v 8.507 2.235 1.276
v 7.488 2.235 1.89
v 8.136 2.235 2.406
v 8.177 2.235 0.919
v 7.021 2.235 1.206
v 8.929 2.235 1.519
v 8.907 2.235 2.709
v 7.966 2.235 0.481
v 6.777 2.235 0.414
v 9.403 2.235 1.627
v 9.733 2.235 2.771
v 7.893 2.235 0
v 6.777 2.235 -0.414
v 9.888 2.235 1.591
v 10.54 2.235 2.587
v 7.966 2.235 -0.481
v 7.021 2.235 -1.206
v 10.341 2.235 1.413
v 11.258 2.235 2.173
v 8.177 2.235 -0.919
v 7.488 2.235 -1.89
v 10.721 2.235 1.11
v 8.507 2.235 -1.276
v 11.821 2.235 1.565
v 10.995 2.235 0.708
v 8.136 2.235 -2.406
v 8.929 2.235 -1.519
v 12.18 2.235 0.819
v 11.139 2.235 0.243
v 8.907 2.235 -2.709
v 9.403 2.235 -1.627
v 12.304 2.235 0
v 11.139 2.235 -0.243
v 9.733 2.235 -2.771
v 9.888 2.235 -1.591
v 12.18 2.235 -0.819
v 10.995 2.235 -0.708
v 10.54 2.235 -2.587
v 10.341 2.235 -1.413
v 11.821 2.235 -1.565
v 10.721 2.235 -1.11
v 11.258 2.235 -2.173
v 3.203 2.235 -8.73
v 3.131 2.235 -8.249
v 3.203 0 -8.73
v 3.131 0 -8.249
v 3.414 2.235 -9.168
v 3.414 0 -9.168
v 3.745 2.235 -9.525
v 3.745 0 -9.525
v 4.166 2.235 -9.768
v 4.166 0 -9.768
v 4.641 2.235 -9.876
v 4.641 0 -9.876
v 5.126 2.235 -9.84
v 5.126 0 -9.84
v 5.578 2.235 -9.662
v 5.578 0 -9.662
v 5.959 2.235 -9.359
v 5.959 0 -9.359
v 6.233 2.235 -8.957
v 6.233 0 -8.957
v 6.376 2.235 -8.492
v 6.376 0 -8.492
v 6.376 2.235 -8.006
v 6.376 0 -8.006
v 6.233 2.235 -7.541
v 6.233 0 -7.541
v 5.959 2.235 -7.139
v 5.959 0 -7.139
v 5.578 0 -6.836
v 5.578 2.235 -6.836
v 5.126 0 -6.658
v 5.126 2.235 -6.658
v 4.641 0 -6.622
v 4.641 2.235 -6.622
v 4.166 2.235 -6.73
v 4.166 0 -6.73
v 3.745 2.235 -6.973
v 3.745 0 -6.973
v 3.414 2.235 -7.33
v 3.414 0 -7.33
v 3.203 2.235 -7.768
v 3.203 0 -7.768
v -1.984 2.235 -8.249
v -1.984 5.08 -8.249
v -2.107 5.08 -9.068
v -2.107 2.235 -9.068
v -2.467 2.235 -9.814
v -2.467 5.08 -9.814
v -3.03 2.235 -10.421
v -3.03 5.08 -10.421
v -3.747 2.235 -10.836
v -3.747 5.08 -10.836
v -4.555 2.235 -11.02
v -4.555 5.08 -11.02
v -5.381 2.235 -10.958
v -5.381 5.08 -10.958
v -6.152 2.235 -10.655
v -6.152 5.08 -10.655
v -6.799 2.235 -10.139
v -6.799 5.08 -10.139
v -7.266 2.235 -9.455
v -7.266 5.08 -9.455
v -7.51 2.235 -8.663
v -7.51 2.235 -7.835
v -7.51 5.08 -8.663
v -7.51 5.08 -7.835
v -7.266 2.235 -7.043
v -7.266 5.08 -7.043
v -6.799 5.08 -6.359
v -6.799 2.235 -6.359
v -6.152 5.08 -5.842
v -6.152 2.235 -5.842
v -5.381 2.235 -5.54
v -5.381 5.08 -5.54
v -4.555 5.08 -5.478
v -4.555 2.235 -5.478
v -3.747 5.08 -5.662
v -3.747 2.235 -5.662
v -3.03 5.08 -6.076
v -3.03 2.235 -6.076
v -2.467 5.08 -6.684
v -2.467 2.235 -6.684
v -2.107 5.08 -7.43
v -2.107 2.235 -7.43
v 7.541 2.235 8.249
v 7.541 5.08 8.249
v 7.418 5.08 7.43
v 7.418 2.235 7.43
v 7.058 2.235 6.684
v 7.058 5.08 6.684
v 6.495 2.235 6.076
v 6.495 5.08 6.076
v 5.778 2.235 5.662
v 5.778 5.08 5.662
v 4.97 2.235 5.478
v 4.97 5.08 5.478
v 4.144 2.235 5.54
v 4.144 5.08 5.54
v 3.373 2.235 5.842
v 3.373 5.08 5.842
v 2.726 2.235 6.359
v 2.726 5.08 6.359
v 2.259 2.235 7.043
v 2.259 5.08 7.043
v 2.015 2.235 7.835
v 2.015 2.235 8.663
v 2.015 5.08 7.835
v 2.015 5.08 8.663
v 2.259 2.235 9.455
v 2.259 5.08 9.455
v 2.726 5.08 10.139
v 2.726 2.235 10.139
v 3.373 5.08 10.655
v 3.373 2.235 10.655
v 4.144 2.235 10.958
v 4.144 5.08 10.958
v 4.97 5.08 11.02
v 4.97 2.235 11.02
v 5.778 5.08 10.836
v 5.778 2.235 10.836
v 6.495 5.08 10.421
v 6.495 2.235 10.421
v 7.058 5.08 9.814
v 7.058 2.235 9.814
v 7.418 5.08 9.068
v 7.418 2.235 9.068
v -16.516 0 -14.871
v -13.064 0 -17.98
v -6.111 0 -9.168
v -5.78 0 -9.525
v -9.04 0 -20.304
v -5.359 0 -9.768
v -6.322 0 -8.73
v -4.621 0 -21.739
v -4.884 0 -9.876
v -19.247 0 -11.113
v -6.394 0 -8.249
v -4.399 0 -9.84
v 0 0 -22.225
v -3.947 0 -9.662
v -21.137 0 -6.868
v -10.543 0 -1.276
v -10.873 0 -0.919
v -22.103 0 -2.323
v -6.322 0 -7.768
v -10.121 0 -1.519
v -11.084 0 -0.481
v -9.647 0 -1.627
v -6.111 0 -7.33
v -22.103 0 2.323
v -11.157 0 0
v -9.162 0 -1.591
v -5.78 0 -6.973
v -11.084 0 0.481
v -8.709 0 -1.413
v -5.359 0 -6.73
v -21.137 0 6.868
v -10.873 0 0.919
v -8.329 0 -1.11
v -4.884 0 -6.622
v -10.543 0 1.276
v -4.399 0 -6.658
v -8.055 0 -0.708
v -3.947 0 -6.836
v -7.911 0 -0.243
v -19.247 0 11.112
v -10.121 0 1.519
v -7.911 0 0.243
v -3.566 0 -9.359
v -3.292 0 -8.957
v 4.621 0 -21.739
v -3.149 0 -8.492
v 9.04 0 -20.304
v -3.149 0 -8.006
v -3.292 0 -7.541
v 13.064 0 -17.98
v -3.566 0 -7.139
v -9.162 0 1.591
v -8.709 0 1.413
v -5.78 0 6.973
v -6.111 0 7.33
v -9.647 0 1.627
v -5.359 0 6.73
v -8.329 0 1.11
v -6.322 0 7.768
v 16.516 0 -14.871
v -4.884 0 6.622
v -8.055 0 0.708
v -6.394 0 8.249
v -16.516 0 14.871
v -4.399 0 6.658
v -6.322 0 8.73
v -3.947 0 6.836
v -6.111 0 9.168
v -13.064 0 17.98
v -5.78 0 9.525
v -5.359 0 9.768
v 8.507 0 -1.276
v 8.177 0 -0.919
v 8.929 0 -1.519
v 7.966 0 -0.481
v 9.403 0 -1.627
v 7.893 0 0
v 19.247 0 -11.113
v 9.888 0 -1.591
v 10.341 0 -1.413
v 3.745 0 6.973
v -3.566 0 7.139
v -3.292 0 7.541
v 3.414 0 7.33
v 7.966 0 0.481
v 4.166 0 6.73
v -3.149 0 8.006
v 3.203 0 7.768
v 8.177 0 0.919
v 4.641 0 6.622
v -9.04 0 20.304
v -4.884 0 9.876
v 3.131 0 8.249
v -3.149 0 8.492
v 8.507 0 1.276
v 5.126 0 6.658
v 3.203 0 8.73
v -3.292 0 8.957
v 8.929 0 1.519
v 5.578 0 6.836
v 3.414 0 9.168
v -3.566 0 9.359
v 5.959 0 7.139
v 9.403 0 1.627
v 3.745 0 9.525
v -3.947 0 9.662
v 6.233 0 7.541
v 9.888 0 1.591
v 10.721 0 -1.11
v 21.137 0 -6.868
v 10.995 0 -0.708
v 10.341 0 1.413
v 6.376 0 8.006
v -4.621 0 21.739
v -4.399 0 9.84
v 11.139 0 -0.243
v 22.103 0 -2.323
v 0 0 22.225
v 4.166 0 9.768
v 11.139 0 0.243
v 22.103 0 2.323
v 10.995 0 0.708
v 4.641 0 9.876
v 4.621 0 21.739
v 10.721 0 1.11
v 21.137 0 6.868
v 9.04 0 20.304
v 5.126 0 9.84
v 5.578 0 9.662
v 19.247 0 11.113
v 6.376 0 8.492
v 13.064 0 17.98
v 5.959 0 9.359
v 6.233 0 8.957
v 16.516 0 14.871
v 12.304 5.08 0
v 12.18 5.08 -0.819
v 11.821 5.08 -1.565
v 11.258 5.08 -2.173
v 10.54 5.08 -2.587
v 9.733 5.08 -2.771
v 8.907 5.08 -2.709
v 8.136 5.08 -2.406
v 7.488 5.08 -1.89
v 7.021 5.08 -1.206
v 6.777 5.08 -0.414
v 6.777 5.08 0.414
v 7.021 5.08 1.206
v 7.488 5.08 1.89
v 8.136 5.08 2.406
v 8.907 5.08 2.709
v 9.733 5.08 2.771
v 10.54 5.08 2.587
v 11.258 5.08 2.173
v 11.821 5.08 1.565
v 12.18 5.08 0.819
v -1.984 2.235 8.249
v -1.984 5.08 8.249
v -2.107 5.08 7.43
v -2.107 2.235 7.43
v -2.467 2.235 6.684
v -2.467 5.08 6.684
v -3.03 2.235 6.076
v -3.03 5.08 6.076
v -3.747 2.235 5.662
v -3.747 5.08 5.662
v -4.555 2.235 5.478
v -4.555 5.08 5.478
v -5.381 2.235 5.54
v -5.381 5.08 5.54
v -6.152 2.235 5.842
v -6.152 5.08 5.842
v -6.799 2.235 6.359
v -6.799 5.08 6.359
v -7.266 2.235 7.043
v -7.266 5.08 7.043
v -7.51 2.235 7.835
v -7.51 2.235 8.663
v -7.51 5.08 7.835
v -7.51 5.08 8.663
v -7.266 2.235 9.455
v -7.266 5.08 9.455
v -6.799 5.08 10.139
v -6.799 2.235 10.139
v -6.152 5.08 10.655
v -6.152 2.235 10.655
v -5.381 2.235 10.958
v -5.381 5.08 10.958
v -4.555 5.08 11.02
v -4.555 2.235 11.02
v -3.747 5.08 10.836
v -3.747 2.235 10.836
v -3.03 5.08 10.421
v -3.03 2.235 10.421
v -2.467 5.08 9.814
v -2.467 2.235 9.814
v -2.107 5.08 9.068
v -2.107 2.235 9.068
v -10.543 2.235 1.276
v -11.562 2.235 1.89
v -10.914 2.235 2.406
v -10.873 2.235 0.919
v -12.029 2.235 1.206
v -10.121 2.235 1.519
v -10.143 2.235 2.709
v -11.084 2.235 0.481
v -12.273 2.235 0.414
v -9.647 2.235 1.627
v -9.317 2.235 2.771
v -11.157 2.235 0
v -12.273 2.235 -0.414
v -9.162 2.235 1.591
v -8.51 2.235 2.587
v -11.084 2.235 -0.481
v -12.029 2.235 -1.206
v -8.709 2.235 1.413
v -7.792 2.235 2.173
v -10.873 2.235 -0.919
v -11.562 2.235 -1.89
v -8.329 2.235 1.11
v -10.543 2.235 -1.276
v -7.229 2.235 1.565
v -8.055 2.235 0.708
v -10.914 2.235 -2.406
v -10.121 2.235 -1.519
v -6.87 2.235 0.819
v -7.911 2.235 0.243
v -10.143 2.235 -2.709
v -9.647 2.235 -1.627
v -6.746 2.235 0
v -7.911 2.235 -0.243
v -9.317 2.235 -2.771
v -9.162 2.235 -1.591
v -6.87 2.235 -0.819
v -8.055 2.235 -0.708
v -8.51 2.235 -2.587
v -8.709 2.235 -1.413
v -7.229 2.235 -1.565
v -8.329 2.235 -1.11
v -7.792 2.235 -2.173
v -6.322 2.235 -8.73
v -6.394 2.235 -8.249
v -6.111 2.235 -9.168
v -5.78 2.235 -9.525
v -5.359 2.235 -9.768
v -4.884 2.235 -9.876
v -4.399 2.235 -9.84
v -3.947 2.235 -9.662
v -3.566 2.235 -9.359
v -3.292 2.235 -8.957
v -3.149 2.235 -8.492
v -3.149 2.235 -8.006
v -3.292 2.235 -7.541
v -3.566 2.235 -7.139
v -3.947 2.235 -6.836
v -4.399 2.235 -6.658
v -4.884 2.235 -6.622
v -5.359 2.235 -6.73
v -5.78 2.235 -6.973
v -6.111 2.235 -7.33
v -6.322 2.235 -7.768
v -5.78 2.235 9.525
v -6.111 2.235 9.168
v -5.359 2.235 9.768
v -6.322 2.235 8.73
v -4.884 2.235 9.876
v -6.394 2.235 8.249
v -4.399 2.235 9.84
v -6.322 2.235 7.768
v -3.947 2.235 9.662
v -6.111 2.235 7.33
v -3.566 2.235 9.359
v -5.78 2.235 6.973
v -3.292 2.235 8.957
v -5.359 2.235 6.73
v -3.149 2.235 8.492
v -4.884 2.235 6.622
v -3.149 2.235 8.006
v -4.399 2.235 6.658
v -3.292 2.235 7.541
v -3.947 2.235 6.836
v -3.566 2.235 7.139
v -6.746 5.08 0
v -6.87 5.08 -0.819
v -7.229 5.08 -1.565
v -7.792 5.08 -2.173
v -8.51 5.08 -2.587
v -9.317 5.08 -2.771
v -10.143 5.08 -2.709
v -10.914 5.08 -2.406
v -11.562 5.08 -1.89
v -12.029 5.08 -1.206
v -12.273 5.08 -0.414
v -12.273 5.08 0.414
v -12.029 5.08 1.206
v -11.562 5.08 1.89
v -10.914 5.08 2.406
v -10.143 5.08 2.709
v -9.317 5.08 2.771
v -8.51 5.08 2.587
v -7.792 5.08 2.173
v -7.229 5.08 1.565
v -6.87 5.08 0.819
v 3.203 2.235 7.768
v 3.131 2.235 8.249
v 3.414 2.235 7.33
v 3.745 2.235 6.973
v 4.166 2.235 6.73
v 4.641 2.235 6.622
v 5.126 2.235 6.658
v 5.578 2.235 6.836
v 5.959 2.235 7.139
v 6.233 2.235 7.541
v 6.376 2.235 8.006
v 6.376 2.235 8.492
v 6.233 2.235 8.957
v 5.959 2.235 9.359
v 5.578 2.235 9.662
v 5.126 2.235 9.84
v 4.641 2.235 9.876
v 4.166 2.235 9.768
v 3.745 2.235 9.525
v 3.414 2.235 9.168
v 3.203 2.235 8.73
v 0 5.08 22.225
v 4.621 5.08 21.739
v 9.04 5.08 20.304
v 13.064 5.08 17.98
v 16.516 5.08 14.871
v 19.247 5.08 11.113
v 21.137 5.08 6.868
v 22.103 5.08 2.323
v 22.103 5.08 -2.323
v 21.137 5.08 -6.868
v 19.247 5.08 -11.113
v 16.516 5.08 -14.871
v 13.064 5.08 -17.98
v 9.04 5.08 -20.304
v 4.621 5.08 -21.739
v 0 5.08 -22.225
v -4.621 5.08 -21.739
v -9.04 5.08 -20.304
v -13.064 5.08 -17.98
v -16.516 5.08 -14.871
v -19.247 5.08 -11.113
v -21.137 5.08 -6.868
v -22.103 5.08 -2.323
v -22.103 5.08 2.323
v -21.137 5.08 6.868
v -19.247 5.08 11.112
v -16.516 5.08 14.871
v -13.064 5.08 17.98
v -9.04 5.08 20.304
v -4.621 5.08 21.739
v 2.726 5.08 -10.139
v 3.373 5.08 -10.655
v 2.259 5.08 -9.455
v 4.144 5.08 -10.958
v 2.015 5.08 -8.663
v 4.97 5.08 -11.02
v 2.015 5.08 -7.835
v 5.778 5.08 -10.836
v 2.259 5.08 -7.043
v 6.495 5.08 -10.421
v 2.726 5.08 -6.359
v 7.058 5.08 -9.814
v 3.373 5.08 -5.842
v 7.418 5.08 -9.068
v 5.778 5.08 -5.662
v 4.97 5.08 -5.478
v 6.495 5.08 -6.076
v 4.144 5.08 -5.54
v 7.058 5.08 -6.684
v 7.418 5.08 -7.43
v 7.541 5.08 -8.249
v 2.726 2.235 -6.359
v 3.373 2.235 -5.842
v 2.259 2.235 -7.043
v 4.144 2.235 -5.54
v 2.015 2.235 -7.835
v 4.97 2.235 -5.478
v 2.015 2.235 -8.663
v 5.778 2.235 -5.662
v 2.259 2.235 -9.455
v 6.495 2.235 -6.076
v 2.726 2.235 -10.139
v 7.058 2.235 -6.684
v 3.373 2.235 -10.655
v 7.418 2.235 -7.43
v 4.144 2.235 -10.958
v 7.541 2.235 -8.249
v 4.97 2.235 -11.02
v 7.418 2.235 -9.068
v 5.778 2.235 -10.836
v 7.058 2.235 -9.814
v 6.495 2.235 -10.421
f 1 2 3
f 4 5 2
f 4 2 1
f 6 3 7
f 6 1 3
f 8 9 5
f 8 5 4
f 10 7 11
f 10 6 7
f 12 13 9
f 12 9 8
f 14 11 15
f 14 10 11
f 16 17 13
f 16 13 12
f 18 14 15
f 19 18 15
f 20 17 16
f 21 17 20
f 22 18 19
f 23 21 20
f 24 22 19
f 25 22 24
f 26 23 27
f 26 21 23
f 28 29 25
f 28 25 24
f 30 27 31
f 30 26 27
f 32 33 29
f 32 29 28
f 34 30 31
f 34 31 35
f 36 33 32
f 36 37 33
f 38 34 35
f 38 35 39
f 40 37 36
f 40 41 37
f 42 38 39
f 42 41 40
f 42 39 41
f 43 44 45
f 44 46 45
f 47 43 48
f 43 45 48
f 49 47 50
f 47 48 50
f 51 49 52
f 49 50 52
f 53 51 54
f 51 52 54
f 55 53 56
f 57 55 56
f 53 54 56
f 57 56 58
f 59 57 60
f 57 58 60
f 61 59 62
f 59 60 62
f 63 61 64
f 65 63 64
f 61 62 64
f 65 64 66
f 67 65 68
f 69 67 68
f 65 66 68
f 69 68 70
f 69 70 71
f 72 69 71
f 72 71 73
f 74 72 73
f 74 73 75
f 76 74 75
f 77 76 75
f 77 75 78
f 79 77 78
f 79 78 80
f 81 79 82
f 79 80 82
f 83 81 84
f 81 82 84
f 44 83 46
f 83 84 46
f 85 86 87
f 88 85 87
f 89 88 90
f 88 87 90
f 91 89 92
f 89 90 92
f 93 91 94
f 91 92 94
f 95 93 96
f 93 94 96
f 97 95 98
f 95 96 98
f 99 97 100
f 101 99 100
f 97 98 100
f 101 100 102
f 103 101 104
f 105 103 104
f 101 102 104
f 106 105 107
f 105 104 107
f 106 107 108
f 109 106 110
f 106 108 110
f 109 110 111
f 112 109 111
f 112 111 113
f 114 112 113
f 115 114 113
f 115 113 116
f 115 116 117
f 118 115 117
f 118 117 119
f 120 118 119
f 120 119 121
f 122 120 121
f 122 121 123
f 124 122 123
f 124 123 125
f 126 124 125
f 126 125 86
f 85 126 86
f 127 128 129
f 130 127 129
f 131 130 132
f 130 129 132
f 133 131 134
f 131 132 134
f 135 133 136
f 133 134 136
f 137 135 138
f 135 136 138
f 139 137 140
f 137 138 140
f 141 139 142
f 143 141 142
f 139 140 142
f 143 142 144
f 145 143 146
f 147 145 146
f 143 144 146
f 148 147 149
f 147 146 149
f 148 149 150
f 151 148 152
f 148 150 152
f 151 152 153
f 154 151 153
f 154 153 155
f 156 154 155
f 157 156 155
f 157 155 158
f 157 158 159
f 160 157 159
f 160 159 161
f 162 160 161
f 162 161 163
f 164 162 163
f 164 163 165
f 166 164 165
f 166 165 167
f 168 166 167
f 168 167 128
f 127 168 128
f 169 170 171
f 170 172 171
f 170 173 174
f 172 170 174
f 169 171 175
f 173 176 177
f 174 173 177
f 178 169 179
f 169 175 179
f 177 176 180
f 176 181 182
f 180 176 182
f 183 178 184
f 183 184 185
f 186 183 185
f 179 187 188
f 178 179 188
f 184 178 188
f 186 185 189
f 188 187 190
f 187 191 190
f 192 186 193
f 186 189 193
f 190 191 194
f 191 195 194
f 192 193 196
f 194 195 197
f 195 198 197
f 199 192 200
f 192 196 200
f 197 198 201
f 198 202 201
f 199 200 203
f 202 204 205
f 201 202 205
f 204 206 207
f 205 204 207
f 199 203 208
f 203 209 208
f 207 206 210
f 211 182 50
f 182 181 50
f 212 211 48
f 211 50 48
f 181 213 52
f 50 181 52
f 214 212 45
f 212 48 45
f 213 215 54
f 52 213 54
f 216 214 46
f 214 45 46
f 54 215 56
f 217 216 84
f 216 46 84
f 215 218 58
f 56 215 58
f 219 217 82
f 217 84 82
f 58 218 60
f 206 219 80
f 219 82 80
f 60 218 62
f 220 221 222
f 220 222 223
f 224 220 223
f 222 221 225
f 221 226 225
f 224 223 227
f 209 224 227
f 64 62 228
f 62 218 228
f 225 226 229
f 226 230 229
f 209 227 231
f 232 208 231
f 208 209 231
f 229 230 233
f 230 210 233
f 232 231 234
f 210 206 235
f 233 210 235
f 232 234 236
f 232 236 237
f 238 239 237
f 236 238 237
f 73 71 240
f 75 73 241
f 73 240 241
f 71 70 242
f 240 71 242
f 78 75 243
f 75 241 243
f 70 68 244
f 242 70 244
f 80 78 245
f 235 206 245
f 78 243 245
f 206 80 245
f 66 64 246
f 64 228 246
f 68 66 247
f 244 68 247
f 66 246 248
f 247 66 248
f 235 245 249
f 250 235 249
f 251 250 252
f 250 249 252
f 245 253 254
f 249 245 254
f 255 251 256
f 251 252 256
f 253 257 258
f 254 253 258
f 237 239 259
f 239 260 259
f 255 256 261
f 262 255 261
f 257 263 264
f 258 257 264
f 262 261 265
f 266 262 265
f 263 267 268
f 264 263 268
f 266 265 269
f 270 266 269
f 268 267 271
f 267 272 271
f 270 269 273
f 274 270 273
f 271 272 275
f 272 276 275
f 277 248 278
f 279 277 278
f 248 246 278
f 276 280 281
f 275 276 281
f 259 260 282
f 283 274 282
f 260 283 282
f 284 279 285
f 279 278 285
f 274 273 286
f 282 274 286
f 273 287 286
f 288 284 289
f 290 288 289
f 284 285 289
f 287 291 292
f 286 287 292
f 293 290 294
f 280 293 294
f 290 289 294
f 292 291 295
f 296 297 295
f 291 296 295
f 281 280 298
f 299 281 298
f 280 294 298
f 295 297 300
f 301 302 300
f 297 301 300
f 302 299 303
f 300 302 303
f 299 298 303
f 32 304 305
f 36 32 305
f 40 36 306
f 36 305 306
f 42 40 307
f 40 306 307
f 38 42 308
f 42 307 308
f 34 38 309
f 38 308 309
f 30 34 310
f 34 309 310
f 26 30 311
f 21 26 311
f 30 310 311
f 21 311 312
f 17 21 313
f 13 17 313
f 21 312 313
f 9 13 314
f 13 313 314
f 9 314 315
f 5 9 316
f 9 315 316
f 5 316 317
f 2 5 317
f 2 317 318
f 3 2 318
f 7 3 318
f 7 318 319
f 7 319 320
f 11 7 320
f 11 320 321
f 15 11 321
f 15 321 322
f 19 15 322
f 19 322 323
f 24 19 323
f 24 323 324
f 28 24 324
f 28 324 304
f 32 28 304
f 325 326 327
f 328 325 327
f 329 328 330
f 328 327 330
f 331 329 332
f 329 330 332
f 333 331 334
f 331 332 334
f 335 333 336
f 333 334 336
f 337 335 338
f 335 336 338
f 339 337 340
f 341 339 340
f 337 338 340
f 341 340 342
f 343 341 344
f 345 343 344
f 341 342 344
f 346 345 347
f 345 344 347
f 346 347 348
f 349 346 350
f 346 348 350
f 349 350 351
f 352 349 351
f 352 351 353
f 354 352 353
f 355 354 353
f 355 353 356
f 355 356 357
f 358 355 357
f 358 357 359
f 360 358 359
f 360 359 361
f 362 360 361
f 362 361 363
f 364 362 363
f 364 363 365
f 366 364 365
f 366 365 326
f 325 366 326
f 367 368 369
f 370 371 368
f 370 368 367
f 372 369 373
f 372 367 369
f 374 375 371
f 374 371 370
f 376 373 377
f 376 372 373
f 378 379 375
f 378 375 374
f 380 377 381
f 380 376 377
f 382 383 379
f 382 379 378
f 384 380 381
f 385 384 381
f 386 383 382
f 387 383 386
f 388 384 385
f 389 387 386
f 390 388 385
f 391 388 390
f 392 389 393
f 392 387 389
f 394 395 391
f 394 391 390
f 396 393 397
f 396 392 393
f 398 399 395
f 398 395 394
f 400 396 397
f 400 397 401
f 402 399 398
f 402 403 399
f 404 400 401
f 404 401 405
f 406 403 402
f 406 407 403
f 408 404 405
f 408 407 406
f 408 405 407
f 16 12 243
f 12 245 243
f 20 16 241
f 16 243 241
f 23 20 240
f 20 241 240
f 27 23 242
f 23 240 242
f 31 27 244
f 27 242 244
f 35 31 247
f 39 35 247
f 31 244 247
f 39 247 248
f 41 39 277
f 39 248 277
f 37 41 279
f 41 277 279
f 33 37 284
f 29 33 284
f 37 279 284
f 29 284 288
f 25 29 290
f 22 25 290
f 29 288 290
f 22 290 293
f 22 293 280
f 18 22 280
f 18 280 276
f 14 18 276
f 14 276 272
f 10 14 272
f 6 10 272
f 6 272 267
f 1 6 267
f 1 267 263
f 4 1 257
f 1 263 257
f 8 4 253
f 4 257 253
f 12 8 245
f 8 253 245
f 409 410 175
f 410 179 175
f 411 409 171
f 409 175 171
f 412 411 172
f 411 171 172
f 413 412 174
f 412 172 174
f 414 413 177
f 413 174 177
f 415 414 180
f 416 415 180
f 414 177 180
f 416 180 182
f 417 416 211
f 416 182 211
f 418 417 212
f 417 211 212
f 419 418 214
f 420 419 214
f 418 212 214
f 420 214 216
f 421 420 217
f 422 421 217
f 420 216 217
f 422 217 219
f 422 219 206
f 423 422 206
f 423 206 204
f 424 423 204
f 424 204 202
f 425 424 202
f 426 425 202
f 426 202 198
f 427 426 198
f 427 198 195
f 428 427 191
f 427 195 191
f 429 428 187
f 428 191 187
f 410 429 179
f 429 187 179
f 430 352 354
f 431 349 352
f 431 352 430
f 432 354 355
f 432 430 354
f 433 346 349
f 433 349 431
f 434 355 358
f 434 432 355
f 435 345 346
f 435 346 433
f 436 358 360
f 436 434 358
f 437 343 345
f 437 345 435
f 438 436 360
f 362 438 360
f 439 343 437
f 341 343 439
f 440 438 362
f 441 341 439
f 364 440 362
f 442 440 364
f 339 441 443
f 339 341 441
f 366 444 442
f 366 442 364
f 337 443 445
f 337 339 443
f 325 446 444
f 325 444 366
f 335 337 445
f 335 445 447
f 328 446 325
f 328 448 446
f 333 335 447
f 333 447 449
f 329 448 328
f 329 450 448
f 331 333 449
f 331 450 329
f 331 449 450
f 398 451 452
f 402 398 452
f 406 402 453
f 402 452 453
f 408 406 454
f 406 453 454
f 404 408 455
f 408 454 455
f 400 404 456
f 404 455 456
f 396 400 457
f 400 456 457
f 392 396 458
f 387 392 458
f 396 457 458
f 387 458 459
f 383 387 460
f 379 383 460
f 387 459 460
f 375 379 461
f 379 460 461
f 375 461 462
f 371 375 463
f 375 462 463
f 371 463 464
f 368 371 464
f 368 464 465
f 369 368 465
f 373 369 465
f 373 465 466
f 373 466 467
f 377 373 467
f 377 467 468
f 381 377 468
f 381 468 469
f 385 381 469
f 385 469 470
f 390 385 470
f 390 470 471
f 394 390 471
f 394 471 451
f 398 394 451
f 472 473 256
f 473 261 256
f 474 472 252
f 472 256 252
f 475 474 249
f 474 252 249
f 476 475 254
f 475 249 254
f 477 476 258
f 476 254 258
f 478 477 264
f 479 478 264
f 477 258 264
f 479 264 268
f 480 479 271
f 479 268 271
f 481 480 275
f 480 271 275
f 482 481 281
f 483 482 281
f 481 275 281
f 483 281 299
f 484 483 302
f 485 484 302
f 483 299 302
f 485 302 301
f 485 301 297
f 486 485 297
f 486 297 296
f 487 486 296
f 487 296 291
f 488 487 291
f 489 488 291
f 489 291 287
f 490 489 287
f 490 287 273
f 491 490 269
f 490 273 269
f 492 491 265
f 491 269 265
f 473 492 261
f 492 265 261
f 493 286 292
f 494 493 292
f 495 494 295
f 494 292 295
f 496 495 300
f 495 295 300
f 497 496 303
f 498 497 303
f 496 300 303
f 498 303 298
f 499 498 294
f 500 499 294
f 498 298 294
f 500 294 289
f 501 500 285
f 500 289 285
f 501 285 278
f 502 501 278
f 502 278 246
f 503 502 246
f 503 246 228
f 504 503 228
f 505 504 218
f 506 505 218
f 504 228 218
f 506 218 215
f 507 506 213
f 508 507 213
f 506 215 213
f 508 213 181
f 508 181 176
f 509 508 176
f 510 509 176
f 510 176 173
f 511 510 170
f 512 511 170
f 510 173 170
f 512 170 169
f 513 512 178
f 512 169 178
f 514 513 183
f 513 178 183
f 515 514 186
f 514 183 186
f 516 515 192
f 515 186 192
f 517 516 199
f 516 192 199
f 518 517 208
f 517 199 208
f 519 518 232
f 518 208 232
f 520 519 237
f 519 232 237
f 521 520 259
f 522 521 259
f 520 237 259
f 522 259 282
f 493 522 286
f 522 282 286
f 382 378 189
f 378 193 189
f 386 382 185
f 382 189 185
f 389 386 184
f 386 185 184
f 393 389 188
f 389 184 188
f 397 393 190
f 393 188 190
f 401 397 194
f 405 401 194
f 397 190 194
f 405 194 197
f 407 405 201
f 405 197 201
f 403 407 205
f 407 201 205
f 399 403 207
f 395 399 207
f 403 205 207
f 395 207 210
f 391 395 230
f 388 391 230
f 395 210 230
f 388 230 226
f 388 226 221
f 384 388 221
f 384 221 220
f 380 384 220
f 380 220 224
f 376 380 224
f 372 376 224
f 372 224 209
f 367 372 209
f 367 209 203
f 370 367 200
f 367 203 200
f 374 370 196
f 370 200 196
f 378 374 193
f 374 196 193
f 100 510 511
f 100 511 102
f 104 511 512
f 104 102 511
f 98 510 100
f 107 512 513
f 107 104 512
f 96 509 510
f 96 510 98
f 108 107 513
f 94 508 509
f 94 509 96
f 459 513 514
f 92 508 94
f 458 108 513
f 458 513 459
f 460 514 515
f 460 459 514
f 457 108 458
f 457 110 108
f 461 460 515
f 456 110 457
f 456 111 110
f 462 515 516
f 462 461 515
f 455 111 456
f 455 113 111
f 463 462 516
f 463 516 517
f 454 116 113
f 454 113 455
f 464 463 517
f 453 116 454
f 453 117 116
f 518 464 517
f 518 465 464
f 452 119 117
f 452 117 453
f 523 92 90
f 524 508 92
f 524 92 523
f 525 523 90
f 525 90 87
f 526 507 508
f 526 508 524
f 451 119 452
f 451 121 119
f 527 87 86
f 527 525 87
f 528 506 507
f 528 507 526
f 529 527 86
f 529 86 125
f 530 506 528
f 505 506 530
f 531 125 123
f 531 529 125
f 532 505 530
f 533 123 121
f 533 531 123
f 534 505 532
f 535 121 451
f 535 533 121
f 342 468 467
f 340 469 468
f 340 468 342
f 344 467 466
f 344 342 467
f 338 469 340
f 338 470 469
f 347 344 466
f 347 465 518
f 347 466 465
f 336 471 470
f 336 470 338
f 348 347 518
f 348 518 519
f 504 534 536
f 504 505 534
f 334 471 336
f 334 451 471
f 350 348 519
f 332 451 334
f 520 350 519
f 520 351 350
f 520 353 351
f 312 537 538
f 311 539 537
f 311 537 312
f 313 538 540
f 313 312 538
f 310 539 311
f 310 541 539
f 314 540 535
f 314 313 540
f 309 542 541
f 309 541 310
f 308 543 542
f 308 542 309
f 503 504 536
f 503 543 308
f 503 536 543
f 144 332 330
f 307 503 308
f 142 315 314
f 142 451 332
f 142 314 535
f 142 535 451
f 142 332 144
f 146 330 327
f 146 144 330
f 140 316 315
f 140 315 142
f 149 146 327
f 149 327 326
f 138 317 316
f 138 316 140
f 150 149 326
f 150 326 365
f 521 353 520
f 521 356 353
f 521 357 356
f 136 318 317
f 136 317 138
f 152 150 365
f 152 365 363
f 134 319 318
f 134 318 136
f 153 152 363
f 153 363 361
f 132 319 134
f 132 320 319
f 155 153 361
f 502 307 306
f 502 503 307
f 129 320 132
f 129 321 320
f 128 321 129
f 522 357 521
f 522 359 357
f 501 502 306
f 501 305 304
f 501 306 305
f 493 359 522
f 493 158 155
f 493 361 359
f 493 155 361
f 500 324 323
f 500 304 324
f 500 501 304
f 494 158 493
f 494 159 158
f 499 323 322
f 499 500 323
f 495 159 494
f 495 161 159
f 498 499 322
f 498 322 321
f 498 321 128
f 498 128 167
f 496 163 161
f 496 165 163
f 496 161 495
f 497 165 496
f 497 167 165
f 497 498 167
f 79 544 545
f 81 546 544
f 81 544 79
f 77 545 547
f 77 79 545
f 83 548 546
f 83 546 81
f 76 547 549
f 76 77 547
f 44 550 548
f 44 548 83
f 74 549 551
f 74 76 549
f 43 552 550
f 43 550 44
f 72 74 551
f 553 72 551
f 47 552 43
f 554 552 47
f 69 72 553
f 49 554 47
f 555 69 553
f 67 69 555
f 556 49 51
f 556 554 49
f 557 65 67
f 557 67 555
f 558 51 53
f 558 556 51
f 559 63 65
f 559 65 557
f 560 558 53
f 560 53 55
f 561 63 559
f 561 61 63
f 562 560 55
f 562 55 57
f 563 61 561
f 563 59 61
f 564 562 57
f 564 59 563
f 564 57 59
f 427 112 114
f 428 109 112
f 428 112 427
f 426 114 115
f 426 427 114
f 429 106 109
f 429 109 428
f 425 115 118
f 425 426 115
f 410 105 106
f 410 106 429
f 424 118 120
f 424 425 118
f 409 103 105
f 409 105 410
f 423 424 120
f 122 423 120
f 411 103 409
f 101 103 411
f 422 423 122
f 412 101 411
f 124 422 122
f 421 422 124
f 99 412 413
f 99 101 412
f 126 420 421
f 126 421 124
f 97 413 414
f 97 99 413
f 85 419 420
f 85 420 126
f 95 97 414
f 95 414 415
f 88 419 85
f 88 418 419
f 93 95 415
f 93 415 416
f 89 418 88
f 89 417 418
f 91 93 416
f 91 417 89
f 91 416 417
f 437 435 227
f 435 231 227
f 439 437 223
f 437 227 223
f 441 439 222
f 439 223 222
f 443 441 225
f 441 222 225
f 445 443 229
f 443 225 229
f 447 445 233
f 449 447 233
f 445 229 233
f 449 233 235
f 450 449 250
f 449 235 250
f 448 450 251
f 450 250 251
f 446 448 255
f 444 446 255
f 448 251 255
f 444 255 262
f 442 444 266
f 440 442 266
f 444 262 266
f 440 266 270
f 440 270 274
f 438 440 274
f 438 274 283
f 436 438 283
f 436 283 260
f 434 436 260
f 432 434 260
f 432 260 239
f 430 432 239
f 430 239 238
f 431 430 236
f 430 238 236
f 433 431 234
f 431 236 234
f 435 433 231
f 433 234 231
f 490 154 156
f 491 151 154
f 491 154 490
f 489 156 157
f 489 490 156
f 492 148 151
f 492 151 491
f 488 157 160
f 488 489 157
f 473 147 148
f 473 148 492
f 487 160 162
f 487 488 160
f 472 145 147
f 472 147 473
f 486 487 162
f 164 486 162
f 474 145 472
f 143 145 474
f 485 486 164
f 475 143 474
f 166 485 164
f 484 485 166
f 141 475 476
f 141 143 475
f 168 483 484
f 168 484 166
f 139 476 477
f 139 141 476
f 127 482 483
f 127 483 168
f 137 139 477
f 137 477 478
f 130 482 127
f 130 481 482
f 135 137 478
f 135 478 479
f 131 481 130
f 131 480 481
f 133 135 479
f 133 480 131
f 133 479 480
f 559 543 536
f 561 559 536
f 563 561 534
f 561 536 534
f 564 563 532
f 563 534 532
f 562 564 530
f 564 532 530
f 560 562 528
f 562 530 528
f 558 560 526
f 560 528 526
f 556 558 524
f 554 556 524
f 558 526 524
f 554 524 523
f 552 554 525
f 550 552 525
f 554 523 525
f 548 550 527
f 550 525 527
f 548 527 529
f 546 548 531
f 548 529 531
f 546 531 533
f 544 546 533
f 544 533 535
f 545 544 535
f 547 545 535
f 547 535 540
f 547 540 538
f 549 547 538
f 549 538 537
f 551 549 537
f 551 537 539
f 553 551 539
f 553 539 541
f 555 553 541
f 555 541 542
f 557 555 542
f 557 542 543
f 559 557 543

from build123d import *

# Parameters (mm, degrees)
SKETCH1_R                                      = 22.225
BOSS_EXTRUDE1_DEPTH                            = 5.08
CBORE_FOR_4_SOCKET_HEAD_CAP_SCREW1_D           = 3.2639
CBORE_FOR_4_SOCKET_HEAD_CAP_SCREW1_CBORE_D     = 5.55752
CBORE_FOR_4_SOCKET_HEAD_CAP_SCREW1_CBORE_DEPTH = 2.8448


with BuildPart() as part:
    # Sketch1 → Boss-Extrude1 (new body)
    with BuildSketch(Plane(origin=(0, 0, 0), x_dir=(1, 0, 0), z_dir=(0, 1, 0))):
        with Locations(Location((0, 0, 0), (0, 0, 270))):
            Circle(SKETCH1_R)
    extrude(amount=BOSS_EXTRUDE1_DEPTH)

    # CBORE for #4 Socket Head Cap Screw1 (through all)
    with Locations(Plane(origin=(0, 5.08, 0), x_dir=(1, 0, 0), z_dir=(0, 1, 0))):
        with Locations((-9.525, 0), (-4.7625, 8.248891971), (4.7625, 8.248891971), (9.525, 0), (4.7625, -8.248891971), (-4.7625, -8.248891971)):
            CounterBoreHole(CBORE_FOR_4_SOCKET_HEAD_CAP_SCREW1_D / 2, CBORE_FOR_4_SOCKET_HEAD_CAP_SCREW1_CBORE_D / 2, CBORE_FOR_4_SOCKET_HEAD_CAP_SCREW1_CBORE_DEPTH)


solid = part.part
